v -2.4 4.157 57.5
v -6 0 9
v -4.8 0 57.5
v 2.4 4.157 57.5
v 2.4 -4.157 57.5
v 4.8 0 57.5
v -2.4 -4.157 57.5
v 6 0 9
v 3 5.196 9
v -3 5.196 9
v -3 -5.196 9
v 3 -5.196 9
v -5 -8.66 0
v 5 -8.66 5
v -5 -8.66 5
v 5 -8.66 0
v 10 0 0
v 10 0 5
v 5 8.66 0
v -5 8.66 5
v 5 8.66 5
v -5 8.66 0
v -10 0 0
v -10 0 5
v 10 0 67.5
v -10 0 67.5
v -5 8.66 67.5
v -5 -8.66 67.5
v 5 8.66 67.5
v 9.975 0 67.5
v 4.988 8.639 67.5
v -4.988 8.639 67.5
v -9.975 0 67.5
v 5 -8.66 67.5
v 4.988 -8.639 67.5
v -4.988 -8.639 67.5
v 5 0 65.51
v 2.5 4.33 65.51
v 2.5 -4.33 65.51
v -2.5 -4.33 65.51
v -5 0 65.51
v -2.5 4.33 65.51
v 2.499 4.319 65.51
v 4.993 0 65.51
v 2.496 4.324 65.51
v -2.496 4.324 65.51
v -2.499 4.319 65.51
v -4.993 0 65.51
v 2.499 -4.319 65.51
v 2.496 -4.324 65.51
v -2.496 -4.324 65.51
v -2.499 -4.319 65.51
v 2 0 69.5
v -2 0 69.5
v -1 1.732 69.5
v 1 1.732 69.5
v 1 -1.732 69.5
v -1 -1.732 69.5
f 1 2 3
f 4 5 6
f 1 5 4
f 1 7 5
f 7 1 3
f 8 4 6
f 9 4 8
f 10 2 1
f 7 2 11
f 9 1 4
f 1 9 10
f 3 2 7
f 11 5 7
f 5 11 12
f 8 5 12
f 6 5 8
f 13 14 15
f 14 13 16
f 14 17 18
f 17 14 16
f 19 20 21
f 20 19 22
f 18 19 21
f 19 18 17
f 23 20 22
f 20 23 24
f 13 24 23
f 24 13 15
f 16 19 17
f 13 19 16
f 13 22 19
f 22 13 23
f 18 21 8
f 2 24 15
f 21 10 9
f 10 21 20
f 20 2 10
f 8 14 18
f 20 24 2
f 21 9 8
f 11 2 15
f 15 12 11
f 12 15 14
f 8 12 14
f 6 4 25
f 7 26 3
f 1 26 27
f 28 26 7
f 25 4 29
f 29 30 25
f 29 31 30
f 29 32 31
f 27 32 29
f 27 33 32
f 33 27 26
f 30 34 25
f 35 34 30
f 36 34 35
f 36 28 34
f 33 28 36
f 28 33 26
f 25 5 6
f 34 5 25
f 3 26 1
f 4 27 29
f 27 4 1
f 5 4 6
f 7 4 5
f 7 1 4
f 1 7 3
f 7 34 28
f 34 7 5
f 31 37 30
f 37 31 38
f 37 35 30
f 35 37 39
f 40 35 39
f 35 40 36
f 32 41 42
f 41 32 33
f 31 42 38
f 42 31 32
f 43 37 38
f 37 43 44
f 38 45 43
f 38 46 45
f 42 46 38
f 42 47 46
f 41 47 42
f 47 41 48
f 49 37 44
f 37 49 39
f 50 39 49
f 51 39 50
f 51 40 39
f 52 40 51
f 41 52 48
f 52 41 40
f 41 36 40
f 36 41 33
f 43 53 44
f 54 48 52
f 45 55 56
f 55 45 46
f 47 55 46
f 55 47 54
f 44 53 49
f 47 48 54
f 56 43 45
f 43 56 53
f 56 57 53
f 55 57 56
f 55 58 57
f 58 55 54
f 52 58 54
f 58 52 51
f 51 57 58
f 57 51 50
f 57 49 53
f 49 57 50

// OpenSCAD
// file: piece_base.scad
include <config.scad>;

module piece_base(height,top_diam){
	union(){
		translate([0,0,base_height+(base_diam-piece_diam)/2])
		cylinder(r1=piece_diam/2,r2=top_diam/2,h=height-base_height-(base_diam-piece_diam)/2);
		cylinder(r=base_diam/2,h=base_height);
		translate([0,0,base_height])
			cylinder(r1=base_diam/2,
						r2=piece_diam/2,
						h=(base_diam-piece_diam)/2);
	}
}

piece_base(pawn_height,piece_diam*0.6);
// file: config.scad
piece_diam = 12;
base_diam = 20;
base_height = 5;
pawn_height = 25;


$fn=6;
// main file
include <config.scad>;
use <piece_base.scad>;

queen_height = pawn_height*2.3;
crown_height = base_height*2;
crown_dent = crown_height*0.2;
peak_height = crown_height*0.4;

module queen(){
	union(){
		piece_base(queen_height,piece_diam*0.8);
		translate([0,0,queen_height]){
			difference(){
				cylinder(r1=piece_diam*0.4,
					r2=base_diam/2,
					h=crown_height);
				translate([0,0,(crown_height-crown_dent)+0.01])
					cylinder(r1=base_diam/4,
						r2=base_diam/2,
						h=crown_dent);
			}
			translate([0,0,crown_height-crown_dent]){
				cylinder(r1=base_diam/4,
							r2=piece_diam/6,
							h=peak_height);
			}
		}
	}
}
queen();
